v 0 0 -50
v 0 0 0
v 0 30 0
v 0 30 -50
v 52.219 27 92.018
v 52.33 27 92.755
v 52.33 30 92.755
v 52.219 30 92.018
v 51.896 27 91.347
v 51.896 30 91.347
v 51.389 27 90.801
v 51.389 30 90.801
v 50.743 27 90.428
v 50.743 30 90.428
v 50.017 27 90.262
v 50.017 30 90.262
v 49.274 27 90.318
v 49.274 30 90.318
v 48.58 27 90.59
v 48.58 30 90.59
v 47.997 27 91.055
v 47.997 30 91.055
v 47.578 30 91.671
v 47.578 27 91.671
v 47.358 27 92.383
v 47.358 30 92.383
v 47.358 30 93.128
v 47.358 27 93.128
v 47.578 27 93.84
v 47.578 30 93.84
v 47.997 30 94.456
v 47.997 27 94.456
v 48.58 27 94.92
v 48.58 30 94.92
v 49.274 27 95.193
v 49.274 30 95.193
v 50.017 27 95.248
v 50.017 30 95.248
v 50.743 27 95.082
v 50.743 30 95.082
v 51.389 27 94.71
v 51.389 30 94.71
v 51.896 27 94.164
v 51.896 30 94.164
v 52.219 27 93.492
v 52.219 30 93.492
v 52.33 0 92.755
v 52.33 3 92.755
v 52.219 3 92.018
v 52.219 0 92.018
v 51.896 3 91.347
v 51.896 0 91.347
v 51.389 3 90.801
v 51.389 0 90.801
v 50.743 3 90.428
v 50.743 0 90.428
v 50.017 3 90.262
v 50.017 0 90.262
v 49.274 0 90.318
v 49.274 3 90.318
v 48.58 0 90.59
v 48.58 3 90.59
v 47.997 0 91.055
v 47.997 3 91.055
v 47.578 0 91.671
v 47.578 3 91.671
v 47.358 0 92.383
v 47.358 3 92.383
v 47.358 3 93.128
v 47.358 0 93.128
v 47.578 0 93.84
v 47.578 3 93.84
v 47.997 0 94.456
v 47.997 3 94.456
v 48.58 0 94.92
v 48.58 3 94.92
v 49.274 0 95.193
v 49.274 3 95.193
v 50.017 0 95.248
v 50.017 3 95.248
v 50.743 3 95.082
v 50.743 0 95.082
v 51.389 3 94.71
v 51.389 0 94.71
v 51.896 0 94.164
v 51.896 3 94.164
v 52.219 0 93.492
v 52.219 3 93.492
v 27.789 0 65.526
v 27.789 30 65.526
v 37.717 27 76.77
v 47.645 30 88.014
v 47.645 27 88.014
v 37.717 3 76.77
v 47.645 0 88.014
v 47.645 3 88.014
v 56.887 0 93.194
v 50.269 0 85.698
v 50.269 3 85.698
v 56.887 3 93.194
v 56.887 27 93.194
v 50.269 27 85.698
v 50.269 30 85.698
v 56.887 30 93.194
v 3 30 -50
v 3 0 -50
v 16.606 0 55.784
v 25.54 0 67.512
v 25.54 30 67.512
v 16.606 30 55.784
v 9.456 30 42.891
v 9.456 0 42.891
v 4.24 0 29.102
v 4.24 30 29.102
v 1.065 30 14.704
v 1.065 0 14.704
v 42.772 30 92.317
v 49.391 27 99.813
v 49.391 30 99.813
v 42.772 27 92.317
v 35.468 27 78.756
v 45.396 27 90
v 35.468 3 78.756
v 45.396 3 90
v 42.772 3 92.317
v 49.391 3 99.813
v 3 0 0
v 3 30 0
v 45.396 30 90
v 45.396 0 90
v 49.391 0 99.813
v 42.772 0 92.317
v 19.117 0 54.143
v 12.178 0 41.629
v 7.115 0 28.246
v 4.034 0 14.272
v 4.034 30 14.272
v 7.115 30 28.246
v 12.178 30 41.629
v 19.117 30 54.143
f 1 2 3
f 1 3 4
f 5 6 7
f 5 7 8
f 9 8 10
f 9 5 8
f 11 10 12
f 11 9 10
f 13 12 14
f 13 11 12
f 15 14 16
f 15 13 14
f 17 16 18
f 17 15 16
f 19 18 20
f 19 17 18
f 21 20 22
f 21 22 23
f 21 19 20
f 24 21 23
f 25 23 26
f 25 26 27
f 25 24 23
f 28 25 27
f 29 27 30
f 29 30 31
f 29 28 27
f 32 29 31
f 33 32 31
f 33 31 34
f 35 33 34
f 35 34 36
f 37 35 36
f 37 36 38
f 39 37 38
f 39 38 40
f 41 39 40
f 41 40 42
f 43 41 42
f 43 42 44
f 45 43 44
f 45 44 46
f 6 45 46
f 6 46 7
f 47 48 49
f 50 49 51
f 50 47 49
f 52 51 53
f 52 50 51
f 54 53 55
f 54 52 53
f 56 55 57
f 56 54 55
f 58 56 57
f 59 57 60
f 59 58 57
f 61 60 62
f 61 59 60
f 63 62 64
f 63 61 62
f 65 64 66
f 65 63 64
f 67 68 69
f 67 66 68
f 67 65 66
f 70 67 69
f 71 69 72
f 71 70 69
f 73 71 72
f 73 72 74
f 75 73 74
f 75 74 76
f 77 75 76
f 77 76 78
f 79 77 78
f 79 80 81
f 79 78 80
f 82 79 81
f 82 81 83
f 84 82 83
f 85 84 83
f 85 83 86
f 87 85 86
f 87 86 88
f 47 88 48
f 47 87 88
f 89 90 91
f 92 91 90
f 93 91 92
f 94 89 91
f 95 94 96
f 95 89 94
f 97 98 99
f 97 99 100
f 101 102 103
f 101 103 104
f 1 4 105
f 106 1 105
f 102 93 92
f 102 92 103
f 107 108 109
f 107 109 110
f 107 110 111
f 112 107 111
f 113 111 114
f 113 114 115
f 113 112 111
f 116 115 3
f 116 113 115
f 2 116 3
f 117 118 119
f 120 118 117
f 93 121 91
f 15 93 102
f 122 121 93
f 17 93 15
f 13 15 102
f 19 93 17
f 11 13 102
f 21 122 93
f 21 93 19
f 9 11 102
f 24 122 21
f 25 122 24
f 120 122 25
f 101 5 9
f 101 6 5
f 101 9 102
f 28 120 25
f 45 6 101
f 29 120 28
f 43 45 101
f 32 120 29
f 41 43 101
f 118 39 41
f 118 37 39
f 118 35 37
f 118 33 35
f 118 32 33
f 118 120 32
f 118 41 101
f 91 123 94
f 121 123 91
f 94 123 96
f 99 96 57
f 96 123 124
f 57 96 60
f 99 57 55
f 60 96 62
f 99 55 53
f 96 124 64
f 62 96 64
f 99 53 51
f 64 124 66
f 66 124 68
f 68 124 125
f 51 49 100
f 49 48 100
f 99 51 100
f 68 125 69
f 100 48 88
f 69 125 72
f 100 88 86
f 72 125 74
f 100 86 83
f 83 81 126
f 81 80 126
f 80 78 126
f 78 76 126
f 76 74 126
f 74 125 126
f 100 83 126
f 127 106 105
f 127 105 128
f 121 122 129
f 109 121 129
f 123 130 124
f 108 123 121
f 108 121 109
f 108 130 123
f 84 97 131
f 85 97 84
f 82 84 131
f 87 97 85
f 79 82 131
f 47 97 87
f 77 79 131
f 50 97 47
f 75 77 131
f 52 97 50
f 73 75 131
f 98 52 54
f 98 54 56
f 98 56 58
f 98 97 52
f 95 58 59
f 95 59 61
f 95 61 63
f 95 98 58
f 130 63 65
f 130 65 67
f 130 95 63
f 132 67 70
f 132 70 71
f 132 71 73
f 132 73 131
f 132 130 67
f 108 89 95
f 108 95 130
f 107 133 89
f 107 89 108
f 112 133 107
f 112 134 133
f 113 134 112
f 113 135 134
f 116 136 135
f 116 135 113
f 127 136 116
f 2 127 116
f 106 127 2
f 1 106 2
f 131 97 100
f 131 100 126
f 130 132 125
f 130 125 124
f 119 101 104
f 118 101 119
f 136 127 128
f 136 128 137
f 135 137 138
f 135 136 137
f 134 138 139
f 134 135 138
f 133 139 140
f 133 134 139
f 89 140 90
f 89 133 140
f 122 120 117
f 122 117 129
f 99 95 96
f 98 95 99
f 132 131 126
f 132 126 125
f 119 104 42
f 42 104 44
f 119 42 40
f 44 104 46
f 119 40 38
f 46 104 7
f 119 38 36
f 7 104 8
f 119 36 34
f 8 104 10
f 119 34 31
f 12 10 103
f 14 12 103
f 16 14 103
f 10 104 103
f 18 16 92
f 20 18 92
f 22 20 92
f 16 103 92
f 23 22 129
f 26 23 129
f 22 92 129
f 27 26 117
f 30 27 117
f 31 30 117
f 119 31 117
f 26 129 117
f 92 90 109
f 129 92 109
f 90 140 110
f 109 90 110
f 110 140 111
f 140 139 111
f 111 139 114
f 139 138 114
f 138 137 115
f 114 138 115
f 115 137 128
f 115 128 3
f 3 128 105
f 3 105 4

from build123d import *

# Parameters (mm, degrees)
ESQUISSE1_R      = 2.5
EXTRUSION1_DEPTH = 30
ESQUISSE3_W      = 25
ESQUISSE3_H      = 24
EXTRUSION2_DEPTH = 105.777068413


with BuildPart() as part:
    # Esquisse1 → Extrusion1 (new body)
    with BuildSketch(Plane(origin=(0, 0, 0), x_dir=(1, 0, 0), z_dir=(0, 1, 0))):
        with BuildLine():
            Line((0, 0), (0, 50))
            Line((0, 50), (3, 50))
            Line((3, 50), (3, 0))
            ThreePointArc((3, 0), (9.404287474, -35.029045403), (27.788566098, -65.526048852))
            Line((27.788566098, -65.526048852), (47.644944538, -88.014362156))
            Line((47.644944538, -88.014362156), (50.26858109, -85.697784671))
            Line((50.26858109, -85.697784671), (56.887373903, -93.193889106))
            Line((56.887373903, -93.193889106), (49.391269469, -99.812681919))
            Line((49.391269469, -99.812681919), (42.772476656, -92.316577485))
            Line((42.772476656, -92.316577485), (45.396113208, -90))
            Line((45.396113208, -90), (25.539734768, -67.511686696))
            ThreePointArc((25.539734768, -67.511686696), (6.598356792, -36.090531627), (0, 0))
        make_face()
        with Locations((49.82992528, -92.755233295)):
            Circle(ESQUISSE1_R, mode=Mode.SUBTRACT)
    extrude(amount=EXTRUSION1_DEPTH)

    # Esquisse3 → Extrusion2 (cut, through all)
    with BuildSketch(Plane(origin=(-21.768488457, 0, 19.220798778), x_dir=(0.661879281, 0, 0.749610443), z_dir=(-0.749610443, 0, 0.661879281))):
        with Locations((95.011686696, 15)):
            Rectangle(ESQUISSE3_W, ESQUISSE3_H)
    extrude(amount=-EXTRUSION2_DEPTH, mode=Mode.SUBTRACT)


solid = part.part
